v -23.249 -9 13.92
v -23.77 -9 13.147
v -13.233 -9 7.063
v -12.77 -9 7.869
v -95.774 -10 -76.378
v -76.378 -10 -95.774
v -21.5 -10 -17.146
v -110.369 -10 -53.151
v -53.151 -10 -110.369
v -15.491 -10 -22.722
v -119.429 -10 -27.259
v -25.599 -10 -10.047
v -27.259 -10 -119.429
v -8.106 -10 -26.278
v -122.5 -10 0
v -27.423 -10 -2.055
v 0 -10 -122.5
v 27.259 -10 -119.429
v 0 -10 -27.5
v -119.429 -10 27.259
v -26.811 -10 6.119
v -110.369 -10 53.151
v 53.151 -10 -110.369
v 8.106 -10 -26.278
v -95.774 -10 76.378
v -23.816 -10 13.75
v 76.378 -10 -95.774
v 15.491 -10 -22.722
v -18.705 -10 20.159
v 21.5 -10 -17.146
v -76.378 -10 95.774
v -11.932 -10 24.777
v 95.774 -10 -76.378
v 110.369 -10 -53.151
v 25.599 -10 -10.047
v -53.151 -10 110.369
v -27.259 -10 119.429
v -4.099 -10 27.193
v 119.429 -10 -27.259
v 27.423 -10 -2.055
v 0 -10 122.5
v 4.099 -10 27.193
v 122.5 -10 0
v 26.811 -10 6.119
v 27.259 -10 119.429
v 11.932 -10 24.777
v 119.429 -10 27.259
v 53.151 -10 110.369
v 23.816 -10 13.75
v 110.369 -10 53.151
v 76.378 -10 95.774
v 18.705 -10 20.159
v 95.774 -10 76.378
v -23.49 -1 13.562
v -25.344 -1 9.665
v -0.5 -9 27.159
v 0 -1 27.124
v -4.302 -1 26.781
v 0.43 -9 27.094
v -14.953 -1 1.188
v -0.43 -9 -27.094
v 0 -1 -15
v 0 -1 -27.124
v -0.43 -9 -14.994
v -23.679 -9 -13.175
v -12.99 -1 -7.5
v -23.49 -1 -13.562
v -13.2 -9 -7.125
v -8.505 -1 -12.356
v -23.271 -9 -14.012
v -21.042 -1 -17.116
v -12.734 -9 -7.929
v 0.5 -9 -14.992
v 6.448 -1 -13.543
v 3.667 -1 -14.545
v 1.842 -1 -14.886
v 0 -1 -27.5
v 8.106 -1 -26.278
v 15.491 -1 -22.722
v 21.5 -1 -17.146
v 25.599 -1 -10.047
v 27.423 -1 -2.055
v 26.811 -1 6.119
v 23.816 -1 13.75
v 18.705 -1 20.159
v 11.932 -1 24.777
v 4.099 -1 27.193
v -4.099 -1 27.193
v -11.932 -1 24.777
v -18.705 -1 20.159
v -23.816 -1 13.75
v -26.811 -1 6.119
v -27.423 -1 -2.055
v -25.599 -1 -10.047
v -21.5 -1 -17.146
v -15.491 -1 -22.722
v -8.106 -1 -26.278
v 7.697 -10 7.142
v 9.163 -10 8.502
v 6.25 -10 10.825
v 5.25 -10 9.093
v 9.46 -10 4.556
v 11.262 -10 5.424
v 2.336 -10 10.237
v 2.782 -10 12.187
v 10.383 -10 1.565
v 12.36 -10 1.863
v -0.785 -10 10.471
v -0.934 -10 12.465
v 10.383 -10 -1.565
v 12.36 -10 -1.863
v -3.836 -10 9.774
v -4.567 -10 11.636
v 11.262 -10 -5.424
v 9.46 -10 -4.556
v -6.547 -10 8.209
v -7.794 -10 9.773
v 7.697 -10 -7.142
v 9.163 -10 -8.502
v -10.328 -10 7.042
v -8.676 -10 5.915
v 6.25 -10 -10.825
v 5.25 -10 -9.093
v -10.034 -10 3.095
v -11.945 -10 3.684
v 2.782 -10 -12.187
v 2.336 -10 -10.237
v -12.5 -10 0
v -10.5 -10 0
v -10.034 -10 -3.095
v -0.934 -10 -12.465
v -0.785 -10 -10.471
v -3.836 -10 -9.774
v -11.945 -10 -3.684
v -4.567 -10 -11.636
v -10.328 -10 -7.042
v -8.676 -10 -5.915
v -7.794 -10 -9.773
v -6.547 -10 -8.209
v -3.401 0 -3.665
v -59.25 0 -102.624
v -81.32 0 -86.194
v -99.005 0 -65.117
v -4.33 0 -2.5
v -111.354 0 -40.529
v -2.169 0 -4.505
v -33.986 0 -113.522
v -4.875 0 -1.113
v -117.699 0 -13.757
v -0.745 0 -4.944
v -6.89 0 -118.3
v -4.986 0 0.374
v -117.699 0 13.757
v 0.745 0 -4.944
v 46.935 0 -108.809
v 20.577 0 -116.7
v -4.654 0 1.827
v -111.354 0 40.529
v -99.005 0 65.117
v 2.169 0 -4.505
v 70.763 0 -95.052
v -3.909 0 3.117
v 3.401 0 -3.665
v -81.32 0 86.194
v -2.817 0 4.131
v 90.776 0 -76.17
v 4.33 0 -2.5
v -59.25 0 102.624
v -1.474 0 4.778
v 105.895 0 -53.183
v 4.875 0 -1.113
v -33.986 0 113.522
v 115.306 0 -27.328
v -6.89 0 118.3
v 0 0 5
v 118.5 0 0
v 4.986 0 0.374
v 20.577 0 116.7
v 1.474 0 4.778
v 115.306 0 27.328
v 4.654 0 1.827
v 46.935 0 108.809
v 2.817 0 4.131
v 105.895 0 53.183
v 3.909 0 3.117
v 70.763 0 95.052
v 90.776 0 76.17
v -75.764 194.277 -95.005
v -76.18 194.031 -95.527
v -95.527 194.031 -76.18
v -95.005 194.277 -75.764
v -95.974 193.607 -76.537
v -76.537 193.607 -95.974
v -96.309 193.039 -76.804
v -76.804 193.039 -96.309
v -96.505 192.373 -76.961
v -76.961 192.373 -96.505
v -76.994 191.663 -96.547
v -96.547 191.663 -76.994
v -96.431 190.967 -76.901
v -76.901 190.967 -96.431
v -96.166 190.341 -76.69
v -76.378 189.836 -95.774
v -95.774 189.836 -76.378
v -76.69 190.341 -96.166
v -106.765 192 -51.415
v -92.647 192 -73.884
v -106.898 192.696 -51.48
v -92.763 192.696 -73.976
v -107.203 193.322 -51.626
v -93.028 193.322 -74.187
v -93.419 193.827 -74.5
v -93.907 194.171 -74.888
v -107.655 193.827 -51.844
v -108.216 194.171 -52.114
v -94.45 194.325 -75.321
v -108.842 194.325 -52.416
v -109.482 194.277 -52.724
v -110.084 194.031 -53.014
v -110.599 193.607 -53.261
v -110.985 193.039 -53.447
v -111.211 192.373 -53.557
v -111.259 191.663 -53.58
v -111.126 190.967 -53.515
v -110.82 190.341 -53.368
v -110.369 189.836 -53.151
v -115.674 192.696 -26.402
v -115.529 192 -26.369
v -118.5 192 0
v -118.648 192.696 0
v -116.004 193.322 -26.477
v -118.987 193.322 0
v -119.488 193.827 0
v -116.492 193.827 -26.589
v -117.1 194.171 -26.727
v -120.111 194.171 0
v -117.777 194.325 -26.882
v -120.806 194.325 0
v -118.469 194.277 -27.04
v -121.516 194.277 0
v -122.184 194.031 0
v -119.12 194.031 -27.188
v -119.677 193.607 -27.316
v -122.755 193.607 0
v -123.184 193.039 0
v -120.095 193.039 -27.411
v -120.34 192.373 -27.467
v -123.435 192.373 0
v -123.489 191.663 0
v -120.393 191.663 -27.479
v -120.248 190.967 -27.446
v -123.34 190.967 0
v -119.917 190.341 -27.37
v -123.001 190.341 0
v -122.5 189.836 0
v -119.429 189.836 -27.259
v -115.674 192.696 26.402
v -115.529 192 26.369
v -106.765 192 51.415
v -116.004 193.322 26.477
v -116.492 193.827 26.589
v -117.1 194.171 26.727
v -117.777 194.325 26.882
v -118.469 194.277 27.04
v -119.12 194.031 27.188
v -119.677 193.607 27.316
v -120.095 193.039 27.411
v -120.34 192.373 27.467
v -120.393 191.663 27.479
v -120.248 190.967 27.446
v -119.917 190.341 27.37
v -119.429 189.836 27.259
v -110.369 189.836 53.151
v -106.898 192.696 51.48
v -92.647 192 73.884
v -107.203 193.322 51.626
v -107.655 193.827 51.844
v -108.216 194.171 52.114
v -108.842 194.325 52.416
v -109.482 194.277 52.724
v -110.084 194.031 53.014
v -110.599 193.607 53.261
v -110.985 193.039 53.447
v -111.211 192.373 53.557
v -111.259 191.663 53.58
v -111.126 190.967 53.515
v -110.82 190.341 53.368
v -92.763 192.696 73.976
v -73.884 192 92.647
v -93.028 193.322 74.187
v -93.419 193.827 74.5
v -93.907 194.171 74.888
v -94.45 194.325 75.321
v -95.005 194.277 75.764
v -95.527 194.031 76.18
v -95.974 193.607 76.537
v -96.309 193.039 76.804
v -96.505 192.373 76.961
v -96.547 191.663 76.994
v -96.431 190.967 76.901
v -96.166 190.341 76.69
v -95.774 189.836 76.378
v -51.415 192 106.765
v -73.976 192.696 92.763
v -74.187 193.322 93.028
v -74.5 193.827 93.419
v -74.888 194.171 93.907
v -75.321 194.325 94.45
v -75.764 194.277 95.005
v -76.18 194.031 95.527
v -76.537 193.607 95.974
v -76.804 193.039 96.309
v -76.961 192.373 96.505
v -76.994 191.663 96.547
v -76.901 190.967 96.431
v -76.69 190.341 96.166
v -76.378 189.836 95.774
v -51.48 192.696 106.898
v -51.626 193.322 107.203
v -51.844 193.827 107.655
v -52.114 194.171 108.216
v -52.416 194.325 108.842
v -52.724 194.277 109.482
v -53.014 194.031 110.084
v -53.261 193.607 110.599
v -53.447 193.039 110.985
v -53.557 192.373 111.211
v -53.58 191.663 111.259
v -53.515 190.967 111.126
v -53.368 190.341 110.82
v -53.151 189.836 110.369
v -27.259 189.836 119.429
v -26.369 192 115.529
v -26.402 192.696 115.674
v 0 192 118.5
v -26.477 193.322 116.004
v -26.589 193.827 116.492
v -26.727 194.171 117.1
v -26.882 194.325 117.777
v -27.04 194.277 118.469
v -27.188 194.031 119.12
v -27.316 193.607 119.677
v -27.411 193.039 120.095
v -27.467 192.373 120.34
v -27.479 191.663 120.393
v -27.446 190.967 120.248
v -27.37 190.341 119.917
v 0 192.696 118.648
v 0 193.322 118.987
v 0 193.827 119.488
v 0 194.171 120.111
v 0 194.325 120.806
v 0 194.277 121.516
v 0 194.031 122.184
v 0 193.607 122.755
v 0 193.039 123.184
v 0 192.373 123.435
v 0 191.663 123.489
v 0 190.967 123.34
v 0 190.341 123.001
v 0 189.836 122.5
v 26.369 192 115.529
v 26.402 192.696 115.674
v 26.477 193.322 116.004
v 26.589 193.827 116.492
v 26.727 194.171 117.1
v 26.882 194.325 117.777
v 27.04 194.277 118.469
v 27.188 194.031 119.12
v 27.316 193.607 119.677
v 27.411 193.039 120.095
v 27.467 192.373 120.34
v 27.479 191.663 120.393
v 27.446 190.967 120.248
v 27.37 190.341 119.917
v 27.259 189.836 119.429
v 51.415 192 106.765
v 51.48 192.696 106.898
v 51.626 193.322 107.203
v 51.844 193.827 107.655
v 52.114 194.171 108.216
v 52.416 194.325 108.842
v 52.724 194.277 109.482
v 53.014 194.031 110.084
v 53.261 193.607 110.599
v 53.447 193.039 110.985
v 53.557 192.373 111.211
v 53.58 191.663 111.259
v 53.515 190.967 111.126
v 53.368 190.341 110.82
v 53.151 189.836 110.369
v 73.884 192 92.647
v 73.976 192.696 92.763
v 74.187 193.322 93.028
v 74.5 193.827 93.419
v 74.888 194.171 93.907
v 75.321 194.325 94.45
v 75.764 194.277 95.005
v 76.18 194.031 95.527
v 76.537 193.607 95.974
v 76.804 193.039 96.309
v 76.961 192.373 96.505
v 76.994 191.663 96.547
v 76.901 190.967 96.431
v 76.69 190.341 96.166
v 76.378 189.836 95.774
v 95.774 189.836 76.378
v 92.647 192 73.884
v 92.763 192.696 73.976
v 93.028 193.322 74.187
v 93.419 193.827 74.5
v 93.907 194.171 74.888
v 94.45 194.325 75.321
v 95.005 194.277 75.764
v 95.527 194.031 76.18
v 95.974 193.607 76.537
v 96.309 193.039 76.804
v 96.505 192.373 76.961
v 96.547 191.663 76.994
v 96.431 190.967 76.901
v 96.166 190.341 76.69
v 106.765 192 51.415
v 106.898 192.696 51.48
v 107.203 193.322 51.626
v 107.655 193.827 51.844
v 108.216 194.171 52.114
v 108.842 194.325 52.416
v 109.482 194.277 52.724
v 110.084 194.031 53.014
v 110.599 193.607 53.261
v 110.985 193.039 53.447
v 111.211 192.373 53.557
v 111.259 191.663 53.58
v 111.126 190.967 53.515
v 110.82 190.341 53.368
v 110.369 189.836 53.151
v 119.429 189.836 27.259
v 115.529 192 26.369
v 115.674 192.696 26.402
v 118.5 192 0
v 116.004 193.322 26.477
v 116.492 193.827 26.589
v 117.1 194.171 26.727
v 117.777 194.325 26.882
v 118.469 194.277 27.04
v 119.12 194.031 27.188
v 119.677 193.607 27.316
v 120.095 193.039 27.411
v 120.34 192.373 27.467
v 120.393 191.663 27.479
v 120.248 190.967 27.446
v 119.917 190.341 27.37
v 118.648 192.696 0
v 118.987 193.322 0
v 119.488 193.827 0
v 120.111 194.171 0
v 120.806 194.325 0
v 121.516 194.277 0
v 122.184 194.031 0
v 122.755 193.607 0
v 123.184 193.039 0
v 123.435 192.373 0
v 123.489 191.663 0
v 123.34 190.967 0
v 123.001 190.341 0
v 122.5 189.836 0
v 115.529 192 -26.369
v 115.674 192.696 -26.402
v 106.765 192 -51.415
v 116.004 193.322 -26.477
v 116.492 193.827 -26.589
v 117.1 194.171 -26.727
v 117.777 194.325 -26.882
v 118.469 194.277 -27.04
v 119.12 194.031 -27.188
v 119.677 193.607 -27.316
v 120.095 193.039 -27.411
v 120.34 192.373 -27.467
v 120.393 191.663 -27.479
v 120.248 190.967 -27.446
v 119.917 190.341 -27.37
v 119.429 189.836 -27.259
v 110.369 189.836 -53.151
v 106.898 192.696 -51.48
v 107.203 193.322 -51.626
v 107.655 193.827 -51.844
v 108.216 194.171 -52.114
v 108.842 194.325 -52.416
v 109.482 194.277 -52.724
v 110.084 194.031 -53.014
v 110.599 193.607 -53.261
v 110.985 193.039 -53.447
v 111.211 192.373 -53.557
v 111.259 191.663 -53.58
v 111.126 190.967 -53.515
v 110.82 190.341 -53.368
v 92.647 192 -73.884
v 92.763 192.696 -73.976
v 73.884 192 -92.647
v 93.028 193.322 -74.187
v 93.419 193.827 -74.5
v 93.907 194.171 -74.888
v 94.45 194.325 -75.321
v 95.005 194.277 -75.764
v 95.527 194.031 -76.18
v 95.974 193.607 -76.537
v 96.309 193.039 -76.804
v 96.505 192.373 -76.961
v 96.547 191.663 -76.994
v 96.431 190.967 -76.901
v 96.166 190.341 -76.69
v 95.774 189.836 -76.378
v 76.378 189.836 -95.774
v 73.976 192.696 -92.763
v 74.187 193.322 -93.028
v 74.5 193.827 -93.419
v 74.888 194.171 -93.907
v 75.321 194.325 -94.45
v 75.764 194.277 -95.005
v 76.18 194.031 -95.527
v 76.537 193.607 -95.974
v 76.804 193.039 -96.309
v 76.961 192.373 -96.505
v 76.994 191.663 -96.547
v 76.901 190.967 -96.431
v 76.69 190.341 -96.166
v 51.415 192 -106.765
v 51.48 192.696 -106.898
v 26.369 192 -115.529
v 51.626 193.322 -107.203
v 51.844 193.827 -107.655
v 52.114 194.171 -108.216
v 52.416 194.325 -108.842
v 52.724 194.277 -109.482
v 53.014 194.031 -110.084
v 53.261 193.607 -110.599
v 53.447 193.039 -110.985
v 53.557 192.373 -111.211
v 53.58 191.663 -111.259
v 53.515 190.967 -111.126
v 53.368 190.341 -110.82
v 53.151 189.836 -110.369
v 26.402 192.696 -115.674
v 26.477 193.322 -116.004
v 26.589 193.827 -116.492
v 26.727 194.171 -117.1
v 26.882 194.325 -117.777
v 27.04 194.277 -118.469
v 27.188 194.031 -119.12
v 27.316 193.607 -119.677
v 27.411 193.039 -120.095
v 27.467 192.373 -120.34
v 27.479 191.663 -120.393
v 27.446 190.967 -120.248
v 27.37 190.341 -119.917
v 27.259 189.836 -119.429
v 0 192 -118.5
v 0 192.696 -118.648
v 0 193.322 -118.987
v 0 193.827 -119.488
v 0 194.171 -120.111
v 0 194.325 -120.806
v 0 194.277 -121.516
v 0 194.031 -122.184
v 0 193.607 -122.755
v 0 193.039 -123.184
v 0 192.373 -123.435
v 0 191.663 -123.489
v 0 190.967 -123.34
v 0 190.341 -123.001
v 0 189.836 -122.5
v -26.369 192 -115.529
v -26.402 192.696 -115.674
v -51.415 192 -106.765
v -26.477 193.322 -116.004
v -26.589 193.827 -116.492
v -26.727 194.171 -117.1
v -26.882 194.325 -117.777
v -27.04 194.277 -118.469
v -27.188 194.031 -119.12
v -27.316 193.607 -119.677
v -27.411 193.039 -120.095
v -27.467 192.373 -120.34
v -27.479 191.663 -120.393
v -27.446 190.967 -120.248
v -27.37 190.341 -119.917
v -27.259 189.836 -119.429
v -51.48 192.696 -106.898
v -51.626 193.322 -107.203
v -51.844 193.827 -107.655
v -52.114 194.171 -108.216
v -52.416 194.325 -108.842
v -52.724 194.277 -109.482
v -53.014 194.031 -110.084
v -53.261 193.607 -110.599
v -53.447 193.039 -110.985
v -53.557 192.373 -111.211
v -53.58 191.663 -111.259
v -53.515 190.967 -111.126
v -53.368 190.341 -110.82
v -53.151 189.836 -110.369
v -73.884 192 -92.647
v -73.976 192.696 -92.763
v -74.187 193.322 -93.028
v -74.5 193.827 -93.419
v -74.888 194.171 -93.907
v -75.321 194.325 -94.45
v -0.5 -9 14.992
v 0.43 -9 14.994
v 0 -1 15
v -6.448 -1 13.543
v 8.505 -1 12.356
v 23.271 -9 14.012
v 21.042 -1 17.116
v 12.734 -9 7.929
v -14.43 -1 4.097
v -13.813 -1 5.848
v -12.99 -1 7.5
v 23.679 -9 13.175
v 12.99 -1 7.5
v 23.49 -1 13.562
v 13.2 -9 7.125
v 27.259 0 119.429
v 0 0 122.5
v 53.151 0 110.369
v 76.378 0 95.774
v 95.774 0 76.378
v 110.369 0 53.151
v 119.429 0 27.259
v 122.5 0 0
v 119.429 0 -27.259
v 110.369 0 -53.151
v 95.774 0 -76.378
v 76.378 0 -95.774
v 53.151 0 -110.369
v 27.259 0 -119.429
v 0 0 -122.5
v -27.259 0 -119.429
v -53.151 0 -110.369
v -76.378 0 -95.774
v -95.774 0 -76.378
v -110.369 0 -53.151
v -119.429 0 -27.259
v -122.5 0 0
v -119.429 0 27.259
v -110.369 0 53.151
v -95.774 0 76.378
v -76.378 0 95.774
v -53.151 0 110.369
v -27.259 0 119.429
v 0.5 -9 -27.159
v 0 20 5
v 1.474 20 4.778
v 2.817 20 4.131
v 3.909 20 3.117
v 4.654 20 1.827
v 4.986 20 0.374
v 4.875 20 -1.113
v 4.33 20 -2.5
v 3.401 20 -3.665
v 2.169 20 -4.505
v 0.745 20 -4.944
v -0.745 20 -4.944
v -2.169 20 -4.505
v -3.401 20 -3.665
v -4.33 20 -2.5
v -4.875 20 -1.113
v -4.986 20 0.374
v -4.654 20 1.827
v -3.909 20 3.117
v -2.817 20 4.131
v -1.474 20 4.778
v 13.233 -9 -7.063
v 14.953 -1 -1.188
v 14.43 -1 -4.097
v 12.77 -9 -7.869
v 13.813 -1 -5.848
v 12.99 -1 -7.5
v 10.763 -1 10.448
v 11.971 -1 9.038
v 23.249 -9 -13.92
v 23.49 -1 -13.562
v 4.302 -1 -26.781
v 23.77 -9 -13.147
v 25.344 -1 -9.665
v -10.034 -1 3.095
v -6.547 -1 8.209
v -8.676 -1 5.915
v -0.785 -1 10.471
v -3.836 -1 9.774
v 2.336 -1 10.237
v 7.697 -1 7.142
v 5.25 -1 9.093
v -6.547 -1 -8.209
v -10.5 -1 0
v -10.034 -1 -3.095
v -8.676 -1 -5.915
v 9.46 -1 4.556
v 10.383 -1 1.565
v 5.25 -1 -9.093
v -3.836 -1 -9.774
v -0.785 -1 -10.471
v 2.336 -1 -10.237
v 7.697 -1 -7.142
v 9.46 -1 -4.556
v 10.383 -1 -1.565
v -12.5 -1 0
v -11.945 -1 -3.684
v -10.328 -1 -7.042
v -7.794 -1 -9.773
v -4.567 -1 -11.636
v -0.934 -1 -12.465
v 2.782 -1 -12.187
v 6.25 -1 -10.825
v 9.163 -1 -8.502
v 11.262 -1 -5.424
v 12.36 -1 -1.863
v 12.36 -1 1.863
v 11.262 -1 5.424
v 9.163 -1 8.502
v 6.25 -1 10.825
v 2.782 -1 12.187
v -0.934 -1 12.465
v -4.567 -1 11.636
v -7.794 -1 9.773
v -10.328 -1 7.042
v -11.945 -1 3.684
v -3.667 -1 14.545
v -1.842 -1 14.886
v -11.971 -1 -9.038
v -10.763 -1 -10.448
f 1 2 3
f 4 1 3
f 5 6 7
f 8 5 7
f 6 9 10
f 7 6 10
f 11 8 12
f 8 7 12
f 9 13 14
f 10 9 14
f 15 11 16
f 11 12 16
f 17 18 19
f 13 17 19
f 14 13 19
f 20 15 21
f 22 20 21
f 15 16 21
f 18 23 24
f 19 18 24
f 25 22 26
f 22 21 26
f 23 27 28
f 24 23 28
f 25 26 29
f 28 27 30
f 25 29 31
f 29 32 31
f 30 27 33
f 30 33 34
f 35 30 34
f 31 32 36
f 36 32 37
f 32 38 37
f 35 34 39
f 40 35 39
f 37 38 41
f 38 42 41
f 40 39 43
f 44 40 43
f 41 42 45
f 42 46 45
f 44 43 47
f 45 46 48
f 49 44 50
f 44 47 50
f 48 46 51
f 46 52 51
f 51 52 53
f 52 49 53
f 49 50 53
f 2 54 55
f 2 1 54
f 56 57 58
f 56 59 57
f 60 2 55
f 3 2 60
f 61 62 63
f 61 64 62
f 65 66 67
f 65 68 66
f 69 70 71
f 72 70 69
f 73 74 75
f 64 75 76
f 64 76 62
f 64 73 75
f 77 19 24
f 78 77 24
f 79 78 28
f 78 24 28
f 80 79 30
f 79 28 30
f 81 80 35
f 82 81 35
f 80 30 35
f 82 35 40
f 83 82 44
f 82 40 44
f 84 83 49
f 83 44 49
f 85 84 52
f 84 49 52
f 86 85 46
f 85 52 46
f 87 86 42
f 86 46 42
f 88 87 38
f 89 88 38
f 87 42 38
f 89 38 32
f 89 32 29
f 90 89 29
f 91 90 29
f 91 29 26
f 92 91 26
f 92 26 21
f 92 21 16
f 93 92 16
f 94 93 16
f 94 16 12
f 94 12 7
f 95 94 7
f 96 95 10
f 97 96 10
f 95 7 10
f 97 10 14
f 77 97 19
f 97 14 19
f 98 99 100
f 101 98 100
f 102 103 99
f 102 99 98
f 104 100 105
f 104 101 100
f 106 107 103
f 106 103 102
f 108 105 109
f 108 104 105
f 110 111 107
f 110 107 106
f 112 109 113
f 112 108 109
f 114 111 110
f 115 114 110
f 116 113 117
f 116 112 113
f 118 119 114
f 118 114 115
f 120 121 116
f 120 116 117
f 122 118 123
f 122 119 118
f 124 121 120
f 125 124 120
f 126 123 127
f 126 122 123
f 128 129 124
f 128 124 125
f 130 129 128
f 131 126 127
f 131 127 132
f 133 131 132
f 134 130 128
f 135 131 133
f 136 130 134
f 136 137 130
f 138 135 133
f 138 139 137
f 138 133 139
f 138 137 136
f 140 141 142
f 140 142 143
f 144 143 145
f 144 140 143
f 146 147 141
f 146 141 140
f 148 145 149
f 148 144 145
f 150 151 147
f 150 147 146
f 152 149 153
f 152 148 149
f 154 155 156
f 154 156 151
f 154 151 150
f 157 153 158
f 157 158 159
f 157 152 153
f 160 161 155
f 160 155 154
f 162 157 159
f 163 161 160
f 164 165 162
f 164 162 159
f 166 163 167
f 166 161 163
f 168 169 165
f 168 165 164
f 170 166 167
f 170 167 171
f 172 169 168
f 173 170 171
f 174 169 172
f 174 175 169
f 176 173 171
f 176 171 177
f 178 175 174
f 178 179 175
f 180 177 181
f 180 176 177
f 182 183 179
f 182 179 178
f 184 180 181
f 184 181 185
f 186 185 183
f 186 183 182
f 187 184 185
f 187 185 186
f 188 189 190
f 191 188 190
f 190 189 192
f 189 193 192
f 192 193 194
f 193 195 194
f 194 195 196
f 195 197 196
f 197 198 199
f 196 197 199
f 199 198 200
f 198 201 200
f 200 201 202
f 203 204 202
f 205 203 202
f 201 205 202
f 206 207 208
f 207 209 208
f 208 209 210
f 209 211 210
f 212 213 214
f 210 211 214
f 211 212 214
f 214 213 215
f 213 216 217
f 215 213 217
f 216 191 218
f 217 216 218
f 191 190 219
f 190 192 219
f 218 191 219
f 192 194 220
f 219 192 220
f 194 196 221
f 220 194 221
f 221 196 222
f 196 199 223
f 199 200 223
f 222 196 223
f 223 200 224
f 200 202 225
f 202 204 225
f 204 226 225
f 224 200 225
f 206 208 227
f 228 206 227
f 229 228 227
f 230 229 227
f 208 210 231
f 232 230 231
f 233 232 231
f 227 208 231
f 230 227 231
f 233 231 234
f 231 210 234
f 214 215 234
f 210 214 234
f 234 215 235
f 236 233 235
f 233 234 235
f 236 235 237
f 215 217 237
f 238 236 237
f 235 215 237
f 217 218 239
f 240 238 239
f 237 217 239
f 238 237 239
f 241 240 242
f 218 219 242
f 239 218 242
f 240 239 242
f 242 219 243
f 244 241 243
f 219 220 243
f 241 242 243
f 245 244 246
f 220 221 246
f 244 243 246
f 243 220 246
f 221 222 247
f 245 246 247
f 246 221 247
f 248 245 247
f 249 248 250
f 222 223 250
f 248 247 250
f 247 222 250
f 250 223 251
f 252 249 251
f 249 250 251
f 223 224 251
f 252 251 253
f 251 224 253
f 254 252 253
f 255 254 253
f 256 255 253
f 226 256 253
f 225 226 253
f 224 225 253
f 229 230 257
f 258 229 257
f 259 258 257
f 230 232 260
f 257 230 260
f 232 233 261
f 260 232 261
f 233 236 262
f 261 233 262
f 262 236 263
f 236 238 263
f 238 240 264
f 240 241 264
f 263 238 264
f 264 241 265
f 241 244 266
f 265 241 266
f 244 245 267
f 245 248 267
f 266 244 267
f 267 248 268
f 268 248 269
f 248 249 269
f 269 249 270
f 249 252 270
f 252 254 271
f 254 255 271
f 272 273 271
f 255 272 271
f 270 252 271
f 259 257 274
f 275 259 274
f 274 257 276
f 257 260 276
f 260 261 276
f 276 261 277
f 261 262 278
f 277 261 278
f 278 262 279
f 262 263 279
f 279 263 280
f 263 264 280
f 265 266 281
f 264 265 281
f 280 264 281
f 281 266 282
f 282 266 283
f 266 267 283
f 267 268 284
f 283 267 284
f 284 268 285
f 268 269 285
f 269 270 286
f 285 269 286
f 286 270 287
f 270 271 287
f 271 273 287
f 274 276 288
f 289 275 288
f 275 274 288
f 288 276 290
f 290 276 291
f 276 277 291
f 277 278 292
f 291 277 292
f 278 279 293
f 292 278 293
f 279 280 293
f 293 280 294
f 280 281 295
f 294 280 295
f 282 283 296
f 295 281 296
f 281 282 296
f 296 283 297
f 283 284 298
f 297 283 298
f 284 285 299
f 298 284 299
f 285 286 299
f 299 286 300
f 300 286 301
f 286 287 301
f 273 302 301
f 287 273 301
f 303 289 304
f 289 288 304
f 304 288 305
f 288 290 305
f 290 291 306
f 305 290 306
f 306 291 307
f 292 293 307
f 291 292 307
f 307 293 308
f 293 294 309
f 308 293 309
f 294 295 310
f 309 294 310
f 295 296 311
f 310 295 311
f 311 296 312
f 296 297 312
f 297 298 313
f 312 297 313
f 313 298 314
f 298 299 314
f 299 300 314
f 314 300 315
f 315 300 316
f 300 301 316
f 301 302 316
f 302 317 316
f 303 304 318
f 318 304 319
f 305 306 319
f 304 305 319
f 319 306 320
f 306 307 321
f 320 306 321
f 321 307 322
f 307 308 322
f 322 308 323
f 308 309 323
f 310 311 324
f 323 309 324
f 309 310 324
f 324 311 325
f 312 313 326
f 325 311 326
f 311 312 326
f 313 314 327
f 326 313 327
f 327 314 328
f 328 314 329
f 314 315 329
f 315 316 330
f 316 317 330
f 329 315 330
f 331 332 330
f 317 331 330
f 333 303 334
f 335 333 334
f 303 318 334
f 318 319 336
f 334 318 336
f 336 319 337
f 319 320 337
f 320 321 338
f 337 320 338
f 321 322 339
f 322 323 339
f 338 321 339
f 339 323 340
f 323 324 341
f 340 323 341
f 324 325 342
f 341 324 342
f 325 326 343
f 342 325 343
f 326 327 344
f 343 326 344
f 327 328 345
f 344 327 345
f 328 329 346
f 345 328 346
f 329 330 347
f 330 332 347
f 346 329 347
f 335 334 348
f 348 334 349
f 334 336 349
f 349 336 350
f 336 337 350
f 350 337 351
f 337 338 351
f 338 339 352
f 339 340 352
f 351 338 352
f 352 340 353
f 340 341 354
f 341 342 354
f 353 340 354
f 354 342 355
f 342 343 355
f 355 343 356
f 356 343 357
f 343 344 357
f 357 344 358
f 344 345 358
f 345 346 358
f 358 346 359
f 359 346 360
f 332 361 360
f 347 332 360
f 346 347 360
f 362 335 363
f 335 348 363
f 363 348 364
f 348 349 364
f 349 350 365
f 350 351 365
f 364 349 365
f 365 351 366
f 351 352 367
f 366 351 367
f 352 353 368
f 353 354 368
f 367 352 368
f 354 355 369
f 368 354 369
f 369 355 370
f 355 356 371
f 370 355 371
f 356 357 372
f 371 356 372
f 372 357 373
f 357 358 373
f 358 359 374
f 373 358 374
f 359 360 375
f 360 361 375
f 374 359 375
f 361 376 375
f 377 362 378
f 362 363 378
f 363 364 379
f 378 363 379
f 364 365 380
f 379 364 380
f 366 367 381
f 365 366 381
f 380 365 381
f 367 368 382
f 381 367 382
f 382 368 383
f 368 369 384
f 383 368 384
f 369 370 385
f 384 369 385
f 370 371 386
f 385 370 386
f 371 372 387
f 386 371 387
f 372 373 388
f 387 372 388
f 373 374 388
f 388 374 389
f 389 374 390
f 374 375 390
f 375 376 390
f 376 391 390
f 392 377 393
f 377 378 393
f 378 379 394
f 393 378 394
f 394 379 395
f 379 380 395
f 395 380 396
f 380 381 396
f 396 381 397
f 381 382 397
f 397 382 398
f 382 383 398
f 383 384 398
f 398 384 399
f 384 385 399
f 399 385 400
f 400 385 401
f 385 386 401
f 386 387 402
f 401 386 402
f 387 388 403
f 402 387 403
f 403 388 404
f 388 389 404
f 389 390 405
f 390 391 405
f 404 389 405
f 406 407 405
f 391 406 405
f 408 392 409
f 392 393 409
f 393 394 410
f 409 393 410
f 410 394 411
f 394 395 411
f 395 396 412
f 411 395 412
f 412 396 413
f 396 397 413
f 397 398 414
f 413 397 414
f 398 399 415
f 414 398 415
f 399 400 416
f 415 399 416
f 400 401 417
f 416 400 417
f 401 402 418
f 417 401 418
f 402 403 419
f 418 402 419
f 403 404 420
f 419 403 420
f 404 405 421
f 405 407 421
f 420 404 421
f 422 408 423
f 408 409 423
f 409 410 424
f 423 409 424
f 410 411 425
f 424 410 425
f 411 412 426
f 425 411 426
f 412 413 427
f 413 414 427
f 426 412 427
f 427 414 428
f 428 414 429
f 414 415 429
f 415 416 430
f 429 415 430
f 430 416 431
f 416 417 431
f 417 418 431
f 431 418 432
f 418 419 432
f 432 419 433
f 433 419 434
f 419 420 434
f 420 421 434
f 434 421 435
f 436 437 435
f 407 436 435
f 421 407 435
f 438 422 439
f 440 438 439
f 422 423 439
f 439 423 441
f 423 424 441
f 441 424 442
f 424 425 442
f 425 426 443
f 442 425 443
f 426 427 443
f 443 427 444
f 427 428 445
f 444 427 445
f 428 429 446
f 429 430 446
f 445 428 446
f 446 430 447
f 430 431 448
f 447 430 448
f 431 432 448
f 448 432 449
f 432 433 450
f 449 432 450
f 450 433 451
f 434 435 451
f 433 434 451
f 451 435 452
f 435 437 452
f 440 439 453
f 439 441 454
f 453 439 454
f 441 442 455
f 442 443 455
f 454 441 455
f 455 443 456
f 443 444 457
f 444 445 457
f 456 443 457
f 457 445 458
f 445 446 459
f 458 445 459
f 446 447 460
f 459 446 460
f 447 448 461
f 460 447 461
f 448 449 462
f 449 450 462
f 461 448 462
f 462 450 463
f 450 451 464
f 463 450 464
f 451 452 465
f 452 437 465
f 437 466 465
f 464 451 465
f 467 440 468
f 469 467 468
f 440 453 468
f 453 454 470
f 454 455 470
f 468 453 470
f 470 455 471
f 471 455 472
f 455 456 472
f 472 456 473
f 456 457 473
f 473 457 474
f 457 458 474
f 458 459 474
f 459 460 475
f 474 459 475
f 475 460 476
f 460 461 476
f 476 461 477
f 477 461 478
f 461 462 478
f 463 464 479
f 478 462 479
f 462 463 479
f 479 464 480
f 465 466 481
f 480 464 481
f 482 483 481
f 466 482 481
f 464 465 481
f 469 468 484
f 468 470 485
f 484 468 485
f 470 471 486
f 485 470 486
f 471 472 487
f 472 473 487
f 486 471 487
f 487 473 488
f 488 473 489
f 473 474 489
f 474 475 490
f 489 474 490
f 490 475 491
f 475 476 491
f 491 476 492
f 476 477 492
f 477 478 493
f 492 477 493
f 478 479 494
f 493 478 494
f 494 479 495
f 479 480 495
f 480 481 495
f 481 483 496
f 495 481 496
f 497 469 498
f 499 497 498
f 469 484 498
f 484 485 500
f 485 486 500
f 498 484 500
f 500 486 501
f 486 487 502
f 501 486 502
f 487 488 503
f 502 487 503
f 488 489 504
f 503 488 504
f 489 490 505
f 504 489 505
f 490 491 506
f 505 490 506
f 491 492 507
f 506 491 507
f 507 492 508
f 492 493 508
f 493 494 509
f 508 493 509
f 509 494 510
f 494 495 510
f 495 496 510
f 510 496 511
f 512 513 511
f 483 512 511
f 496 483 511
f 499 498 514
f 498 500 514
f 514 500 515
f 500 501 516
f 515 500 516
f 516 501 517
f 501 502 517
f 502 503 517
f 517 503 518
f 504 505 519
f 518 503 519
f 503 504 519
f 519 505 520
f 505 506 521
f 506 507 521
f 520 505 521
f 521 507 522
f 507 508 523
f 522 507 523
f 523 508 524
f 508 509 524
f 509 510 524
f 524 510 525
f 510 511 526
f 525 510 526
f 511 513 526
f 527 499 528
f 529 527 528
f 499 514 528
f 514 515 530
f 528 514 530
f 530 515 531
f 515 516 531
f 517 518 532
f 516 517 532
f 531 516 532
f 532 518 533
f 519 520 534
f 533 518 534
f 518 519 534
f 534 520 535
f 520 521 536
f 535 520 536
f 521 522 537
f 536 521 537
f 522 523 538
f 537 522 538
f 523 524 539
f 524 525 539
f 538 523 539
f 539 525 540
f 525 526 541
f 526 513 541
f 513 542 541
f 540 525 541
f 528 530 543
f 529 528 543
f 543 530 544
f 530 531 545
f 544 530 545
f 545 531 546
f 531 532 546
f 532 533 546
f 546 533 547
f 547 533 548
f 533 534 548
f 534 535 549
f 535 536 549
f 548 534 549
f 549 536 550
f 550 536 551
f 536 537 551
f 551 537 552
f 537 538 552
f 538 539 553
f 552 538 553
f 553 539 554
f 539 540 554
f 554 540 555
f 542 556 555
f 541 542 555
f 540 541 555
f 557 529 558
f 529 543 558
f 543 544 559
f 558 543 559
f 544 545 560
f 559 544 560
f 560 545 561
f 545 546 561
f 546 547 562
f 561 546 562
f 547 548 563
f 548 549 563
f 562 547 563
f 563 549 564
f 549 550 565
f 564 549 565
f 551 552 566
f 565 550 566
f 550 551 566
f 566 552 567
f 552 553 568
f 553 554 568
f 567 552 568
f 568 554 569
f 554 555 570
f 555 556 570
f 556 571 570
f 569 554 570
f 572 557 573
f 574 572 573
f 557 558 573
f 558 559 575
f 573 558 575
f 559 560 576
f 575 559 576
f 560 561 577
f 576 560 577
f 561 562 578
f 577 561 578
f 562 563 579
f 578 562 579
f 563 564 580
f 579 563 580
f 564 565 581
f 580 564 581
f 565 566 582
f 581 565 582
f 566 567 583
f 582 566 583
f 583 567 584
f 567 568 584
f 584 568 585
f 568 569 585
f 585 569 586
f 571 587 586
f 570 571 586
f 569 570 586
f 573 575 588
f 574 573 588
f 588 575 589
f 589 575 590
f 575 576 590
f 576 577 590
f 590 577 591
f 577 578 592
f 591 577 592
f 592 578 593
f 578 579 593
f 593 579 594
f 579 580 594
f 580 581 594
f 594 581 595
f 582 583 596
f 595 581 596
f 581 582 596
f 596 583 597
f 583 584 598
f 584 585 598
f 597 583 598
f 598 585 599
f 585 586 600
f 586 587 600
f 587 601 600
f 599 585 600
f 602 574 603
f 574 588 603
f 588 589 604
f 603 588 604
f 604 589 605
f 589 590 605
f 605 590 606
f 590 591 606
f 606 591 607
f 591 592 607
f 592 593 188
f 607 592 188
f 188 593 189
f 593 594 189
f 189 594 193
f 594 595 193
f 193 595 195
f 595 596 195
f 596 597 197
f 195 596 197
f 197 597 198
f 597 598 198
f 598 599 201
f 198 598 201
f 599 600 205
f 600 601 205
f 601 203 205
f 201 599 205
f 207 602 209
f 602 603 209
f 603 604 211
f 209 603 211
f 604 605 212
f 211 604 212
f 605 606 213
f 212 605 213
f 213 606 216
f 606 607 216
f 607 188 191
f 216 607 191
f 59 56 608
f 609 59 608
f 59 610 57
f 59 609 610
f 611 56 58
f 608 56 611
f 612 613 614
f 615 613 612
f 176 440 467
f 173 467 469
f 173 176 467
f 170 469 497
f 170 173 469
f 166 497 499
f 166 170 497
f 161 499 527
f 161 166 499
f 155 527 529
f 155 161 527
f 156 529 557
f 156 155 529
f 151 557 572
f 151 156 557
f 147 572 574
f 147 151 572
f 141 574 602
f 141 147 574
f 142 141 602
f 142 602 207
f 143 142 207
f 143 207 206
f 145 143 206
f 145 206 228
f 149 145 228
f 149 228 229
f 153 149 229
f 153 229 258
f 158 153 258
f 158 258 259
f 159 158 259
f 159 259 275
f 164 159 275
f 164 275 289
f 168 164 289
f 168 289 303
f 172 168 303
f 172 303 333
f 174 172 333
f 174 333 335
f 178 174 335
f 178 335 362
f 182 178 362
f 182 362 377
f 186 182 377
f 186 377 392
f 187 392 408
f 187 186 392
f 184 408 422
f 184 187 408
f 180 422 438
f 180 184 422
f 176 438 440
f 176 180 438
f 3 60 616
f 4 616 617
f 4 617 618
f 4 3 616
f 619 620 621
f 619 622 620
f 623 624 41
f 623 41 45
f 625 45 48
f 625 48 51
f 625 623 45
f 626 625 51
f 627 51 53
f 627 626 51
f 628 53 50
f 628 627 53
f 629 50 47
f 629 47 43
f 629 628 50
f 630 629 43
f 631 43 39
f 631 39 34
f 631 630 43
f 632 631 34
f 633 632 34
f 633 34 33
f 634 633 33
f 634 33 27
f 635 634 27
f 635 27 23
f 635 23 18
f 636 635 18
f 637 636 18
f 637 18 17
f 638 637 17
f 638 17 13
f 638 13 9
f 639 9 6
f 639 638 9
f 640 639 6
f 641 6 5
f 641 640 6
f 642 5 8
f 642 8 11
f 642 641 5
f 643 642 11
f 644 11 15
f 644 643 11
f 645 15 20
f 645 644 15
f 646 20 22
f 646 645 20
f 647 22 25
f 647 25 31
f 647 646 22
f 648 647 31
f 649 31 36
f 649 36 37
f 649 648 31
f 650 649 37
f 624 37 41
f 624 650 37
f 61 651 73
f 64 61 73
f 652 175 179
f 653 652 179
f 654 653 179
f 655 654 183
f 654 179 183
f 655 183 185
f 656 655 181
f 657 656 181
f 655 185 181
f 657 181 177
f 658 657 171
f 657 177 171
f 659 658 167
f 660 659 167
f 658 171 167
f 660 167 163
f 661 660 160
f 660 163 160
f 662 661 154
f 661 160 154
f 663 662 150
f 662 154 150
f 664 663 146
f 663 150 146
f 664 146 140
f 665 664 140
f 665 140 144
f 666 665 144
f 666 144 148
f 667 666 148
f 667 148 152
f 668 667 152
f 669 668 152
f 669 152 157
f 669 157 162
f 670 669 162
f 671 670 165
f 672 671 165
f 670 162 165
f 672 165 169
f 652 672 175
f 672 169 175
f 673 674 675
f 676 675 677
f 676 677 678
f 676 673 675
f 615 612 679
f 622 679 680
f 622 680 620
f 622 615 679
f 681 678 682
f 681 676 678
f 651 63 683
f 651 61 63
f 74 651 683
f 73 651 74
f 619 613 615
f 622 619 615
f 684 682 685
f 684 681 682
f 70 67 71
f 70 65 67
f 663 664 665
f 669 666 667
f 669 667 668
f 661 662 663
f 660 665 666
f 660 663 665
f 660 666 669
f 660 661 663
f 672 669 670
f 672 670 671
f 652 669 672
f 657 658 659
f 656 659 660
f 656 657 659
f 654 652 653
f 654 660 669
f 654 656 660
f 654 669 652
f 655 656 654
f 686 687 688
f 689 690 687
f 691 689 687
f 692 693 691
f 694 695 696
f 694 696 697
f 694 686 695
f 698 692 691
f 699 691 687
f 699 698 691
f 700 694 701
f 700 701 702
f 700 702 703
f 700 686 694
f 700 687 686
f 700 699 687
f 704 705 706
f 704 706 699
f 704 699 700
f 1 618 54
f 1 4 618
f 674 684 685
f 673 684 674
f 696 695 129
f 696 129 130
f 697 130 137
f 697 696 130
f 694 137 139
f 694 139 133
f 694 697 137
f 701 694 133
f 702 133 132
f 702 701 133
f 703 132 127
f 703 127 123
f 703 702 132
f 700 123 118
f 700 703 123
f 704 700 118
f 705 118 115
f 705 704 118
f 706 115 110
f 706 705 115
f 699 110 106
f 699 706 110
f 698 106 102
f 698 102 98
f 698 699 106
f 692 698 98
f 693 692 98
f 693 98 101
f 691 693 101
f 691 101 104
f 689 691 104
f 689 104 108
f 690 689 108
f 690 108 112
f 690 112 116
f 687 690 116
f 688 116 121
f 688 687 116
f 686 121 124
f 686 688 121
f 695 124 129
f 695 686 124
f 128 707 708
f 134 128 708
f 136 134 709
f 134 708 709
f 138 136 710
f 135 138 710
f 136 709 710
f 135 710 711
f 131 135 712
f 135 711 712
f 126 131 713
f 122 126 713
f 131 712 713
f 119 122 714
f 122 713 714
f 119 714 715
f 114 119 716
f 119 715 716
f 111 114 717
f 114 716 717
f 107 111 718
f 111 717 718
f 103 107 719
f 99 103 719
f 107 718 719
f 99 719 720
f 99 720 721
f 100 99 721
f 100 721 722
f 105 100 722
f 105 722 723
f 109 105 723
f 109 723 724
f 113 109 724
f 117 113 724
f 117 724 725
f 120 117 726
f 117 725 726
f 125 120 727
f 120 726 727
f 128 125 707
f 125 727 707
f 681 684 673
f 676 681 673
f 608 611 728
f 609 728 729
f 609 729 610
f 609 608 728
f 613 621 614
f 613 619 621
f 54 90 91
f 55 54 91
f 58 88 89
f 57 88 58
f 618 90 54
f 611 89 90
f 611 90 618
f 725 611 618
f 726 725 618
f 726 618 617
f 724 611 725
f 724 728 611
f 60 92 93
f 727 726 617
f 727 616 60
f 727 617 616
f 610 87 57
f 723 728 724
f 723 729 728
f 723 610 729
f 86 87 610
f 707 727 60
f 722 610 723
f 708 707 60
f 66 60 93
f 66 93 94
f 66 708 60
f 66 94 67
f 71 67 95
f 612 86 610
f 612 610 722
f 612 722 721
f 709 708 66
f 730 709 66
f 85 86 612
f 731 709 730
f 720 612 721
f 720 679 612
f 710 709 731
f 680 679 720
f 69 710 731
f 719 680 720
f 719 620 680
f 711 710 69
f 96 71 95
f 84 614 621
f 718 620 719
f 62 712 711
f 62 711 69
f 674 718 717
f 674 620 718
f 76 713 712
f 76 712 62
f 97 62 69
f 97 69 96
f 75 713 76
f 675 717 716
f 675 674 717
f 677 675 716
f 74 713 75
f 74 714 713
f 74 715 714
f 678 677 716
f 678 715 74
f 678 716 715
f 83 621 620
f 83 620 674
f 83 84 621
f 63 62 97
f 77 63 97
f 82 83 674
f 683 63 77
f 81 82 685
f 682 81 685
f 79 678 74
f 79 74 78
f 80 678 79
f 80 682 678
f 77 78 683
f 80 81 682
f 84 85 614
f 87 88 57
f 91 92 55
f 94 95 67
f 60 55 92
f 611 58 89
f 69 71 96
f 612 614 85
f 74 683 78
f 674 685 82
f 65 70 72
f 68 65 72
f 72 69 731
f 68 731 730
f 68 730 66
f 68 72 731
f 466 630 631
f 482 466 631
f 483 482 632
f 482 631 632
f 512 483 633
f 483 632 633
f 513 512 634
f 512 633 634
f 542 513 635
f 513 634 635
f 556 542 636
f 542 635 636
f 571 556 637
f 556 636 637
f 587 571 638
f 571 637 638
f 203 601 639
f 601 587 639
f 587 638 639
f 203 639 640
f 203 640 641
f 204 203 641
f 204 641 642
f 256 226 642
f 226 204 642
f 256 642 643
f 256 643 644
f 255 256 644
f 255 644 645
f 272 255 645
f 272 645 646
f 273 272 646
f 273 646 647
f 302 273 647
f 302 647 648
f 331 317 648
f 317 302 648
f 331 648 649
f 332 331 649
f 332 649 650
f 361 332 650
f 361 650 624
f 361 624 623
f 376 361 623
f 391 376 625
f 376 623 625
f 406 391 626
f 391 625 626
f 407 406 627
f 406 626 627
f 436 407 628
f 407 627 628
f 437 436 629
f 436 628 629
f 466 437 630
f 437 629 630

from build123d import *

# Parameters (mm, degrees)
SKETCH3_R           = 122.5
SKETCH3_R_2         = 118.5
EXTRUDE_THIN1_DEPTH = 192
SKETCH3_3_R         = 122.5
BOSS_EXTRUDE4_DEPTH = 10
SKETCH11_R          = 5
BOSS_EXTRUDE5_DEPTH = 20
SKETCH13_R          = 27.5
CUT_EXTRUDE2_DEPTH  = 9
CIRPATTERN1_COUNT   = 6
SKETCH23_R          = 12.5
SKETCH23_R_2        = 10.5
EXTRUDE_THIN2_DEPTH = 9


with BuildPart() as part:
    # Sketch3 → Extrude-Thin1 (new body)
    with BuildSketch(Plane(origin=(0, 0, 0), x_dir=(1, 0, 0), z_dir=(0, 1, 0))):
        Circle(SKETCH3_R)
        Circle(SKETCH3_R_2, mode=Mode.SUBTRACT)
    extrude(amount=EXTRUDE_THIN1_DEPTH)

    # Sketch9 → Revolve2 (revolve)
    with BuildSketch(Plane.XY):
        with BuildLine():
            Line((121.305664583, 189.351586859), (121.305664583, 192))
            Line((121.305664583, 192), (118.5, 192))
            ThreePointArc((118.5, 192), (122.710443221, 193.650108285), (121.305664583, 189.351586859))
        make_face()
    revolve(axis=Axis((0, -1000, 0), (0, 1, 0)))


with BuildPart() as body_2:
    # Sketch3<3> → Boss-Extrude4 (new body)
    with BuildSketch(Plane(origin=(0, 0, 0), x_dir=(1, 0, 0), z_dir=(0, 1, 0))):
        Circle(SKETCH3_3_R)
    extrude(amount=-BOSS_EXTRUDE4_DEPTH)


    add(part.part)  # Boss-Extrude5 merges part
    # Sketch11 → Boss-Extrude5 (add)
    with BuildSketch(Plane(origin=(0, 0, 0), x_dir=(1, 0, 0), z_dir=(0, 1, 0))):
        Circle(SKETCH11_R)
    extrude(amount=BOSS_EXTRUDE5_DEPTH)

    # Sketch13 → Cut-Extrude2 (cut)
    with BuildSketch(Plane.XZ.offset(10)):
        Circle(SKETCH13_R)
    extrude(amount=-CUT_EXTRUDE2_DEPTH, mode=Mode.SUBTRACT)

    # Sketch15 for Loft10 → Loft10 section 0
    with BuildSketch(Plane.XZ.offset(1)):
        with BuildLine():
            Line((0, -15), (0, -27.124270964))
            # circular arc as an exact rational Bezier (weights 1, cos(half-angle), 1)
            Bezier((0, -27.124270964), (2.164566304, -27.124270964), (4.301737718, -26.780984447), weights=[1, 0.996830963, 1])
            Line((4.301737718, -26.780984447), (6.447780139, -13.543490366))
            Bezier((6.447780139, -13.543490366), (3.388397874, -15), (0, -15), weights=[1, 0.975422821, 1])
        make_face()
    # Sketch19 for Loft10 → Loft10 section 1
    with BuildSketch(Plane(origin=(0, -9, 0), x_dir=(1, 0, 0), z_dir=(0, 1, 0))):
        with BuildLine():
            Line((-0.43008531, 27.094099047), (-0.43008531, 14.993980537))
            Bezier((-0.43008531, 14.993980537), (0.03482173, 15.006996741), (0.49966504, 14.99187476), weights=[1, 0.999542352, 1])
            Line((0.49966504, 14.99187476), (0.49966504, 27.159324131))
            Line((0.49966504, 27.159324131), (-0.43008531, 27.094099047))
        make_face()
    loft10 = loft()

    # CirPattern1: Loft10 ×6 about axis
    cirpattern1_axis = Axis((0, -1000, 0), (0, 1, 0))
    for i in range(1, CIRPATTERN1_COUNT):
        add(loft10.rotate(cirpattern1_axis, i * 360 / CIRPATTERN1_COUNT))

    # Sketch23 → Extrude-Thin2 (add)
    with BuildSketch(Plane(origin=(0, -1, 0), x_dir=(-1, 0, 0), z_dir=(0, -1, 0))):
        Circle(SKETCH23_R)
        Circle(SKETCH23_R_2, mode=Mode.SUBTRACT)
    extrude(amount=EXTRUDE_THIN2_DEPTH)


solid = body_2.part
